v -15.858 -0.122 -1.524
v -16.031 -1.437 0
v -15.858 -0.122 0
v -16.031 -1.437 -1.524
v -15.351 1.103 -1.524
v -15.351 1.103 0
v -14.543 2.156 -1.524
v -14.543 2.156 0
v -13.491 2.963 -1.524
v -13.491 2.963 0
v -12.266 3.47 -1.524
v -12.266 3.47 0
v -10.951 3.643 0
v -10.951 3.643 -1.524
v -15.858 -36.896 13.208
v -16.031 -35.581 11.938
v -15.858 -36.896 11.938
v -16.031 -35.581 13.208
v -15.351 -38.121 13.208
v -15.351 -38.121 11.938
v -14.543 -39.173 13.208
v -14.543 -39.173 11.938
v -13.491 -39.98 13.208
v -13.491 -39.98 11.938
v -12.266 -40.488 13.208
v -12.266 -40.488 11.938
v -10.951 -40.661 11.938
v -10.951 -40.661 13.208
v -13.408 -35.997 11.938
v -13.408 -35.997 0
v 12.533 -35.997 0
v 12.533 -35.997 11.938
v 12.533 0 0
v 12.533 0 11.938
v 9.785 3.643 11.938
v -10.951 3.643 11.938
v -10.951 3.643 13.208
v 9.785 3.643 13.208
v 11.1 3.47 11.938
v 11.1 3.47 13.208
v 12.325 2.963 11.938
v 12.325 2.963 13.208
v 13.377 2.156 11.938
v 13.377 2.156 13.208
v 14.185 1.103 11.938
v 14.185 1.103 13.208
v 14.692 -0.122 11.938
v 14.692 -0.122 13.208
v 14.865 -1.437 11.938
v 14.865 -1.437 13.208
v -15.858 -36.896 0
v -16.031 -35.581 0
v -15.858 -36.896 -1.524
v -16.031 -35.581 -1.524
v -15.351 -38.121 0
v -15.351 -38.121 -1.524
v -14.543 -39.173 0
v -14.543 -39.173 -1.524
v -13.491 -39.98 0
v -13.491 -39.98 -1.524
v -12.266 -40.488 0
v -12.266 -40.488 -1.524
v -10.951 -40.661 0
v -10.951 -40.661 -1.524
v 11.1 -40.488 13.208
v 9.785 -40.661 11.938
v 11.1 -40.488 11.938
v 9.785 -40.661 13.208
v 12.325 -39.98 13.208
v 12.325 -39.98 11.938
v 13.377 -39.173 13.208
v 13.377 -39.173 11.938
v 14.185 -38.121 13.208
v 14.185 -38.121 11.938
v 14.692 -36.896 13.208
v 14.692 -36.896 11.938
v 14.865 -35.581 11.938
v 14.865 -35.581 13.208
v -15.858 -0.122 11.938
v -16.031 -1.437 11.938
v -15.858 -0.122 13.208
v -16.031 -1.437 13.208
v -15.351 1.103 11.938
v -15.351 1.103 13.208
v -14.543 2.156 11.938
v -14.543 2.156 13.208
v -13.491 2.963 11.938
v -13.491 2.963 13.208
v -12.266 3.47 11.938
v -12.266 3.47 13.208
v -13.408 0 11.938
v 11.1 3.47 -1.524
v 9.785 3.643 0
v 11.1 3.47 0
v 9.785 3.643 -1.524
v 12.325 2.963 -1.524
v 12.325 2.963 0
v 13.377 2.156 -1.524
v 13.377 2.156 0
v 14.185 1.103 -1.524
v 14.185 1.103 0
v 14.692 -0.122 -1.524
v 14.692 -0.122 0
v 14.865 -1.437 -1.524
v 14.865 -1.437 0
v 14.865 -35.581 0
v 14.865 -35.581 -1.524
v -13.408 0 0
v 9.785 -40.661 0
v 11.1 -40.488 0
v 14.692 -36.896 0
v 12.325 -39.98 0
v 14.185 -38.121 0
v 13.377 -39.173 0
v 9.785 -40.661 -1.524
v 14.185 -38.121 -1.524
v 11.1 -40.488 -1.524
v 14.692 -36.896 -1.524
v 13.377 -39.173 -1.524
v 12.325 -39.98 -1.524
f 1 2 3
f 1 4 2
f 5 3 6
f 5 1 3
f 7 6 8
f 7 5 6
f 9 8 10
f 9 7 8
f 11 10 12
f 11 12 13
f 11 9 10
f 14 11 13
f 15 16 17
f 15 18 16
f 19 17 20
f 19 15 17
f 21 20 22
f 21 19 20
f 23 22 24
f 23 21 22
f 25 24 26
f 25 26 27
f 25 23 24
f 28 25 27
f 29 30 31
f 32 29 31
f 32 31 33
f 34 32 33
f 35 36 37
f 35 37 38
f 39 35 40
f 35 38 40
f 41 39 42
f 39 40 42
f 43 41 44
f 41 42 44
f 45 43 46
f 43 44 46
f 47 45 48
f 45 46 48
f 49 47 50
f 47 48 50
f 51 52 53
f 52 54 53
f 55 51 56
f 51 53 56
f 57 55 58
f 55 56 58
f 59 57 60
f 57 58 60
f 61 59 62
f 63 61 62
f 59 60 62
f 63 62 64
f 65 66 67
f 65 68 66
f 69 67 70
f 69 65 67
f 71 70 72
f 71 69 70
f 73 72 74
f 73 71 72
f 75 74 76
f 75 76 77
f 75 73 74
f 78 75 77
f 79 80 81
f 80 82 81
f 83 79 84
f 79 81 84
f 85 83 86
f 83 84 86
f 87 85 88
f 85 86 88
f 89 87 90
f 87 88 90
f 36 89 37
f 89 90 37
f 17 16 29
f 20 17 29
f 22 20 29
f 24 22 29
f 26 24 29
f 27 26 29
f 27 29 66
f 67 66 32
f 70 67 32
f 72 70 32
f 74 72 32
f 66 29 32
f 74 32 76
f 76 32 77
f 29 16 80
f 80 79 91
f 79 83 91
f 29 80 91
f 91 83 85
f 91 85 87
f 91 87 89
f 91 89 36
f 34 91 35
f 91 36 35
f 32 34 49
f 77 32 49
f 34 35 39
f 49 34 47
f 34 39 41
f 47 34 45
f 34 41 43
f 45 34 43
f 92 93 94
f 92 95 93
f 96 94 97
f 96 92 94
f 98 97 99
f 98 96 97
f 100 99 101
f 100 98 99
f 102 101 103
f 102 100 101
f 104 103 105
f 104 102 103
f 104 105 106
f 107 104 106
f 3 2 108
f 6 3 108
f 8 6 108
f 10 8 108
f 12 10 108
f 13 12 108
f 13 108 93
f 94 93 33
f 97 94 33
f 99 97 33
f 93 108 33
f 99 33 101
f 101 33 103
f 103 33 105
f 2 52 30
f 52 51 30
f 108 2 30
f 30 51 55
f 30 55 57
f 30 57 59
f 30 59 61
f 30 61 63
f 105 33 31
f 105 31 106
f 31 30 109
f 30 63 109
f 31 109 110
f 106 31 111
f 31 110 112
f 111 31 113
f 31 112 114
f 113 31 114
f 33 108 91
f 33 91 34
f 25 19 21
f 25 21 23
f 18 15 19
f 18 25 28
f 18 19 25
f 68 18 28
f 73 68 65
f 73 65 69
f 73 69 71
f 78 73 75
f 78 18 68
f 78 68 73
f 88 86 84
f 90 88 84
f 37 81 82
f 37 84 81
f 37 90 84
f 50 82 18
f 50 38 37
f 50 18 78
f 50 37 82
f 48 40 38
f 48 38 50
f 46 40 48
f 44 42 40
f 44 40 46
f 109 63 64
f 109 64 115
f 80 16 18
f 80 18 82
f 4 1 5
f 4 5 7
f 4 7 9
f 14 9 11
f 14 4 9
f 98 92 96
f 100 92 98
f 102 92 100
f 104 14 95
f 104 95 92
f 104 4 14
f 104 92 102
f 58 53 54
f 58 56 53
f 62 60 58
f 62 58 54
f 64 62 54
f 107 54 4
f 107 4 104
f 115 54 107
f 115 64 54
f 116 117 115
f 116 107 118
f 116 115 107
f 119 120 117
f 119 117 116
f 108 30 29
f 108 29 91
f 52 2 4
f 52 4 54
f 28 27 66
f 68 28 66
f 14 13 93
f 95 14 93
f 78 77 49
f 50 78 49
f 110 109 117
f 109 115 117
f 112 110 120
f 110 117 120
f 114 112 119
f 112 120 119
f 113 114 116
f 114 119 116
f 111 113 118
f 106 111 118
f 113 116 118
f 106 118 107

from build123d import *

# Parameters (mm, degrees)
F0_W     = 25.94131
F0_H     = 35.997212
F1_DEPTH = 11.938
F2_W     = 30.896392
F2_H     = 44.304264
F3_DEPTH = 1.27
F4_W     = 30.896392
F4_H     = 44.304264
F5_DEPTH = 1.524
F6_R     = 5.08


with BuildPart() as f1:
    # F0 (on Top) → F1 (new body)
    with BuildSketch(Plane.XY):
        with Locations((-0.437213, -17.998606)):
            Rectangle(F0_W, F0_H)
    extrude(amount=F1_DEPTH)

    # F2 (on face) → F3 (join)
    with BuildSketch(Plane.XY.offset(11.938)):
        with Locations((-0.58295, -18.508689)):
            Rectangle(F2_W, F2_H)
    extrude(amount=F3_DEPTH)

    # F4 (on face) → F5 (join)
    with BuildSketch(Plane(origin=(0, 0, 0), x_dir=(1, 0, 0), z_dir=(0, 0, -1))):
        with Locations((-0.58295, 18.508689)):
            Rectangle(F4_W, F4_H)
    extrude(amount=F5_DEPTH)

    # F6
    f6_edges = [f1.edges().sort_by_distance(p)[0] for p in [
        (14.865246, -40.660821, -0.762),
        (14.865246, -40.660821, 12.573),
        (14.865246, 3.643443, -0.762),
        (-16.031146, -40.660821, -0.762),
        (-16.031146, -40.660821, 12.573),
        (14.865246, 3.643443, 12.573),
        (-16.031146, 3.643443, 12.573),
        (-16.031146, 3.643443, -0.762),
    ]]
    fillet(f6_edges, radius=F6_R)


solid = f1.part
